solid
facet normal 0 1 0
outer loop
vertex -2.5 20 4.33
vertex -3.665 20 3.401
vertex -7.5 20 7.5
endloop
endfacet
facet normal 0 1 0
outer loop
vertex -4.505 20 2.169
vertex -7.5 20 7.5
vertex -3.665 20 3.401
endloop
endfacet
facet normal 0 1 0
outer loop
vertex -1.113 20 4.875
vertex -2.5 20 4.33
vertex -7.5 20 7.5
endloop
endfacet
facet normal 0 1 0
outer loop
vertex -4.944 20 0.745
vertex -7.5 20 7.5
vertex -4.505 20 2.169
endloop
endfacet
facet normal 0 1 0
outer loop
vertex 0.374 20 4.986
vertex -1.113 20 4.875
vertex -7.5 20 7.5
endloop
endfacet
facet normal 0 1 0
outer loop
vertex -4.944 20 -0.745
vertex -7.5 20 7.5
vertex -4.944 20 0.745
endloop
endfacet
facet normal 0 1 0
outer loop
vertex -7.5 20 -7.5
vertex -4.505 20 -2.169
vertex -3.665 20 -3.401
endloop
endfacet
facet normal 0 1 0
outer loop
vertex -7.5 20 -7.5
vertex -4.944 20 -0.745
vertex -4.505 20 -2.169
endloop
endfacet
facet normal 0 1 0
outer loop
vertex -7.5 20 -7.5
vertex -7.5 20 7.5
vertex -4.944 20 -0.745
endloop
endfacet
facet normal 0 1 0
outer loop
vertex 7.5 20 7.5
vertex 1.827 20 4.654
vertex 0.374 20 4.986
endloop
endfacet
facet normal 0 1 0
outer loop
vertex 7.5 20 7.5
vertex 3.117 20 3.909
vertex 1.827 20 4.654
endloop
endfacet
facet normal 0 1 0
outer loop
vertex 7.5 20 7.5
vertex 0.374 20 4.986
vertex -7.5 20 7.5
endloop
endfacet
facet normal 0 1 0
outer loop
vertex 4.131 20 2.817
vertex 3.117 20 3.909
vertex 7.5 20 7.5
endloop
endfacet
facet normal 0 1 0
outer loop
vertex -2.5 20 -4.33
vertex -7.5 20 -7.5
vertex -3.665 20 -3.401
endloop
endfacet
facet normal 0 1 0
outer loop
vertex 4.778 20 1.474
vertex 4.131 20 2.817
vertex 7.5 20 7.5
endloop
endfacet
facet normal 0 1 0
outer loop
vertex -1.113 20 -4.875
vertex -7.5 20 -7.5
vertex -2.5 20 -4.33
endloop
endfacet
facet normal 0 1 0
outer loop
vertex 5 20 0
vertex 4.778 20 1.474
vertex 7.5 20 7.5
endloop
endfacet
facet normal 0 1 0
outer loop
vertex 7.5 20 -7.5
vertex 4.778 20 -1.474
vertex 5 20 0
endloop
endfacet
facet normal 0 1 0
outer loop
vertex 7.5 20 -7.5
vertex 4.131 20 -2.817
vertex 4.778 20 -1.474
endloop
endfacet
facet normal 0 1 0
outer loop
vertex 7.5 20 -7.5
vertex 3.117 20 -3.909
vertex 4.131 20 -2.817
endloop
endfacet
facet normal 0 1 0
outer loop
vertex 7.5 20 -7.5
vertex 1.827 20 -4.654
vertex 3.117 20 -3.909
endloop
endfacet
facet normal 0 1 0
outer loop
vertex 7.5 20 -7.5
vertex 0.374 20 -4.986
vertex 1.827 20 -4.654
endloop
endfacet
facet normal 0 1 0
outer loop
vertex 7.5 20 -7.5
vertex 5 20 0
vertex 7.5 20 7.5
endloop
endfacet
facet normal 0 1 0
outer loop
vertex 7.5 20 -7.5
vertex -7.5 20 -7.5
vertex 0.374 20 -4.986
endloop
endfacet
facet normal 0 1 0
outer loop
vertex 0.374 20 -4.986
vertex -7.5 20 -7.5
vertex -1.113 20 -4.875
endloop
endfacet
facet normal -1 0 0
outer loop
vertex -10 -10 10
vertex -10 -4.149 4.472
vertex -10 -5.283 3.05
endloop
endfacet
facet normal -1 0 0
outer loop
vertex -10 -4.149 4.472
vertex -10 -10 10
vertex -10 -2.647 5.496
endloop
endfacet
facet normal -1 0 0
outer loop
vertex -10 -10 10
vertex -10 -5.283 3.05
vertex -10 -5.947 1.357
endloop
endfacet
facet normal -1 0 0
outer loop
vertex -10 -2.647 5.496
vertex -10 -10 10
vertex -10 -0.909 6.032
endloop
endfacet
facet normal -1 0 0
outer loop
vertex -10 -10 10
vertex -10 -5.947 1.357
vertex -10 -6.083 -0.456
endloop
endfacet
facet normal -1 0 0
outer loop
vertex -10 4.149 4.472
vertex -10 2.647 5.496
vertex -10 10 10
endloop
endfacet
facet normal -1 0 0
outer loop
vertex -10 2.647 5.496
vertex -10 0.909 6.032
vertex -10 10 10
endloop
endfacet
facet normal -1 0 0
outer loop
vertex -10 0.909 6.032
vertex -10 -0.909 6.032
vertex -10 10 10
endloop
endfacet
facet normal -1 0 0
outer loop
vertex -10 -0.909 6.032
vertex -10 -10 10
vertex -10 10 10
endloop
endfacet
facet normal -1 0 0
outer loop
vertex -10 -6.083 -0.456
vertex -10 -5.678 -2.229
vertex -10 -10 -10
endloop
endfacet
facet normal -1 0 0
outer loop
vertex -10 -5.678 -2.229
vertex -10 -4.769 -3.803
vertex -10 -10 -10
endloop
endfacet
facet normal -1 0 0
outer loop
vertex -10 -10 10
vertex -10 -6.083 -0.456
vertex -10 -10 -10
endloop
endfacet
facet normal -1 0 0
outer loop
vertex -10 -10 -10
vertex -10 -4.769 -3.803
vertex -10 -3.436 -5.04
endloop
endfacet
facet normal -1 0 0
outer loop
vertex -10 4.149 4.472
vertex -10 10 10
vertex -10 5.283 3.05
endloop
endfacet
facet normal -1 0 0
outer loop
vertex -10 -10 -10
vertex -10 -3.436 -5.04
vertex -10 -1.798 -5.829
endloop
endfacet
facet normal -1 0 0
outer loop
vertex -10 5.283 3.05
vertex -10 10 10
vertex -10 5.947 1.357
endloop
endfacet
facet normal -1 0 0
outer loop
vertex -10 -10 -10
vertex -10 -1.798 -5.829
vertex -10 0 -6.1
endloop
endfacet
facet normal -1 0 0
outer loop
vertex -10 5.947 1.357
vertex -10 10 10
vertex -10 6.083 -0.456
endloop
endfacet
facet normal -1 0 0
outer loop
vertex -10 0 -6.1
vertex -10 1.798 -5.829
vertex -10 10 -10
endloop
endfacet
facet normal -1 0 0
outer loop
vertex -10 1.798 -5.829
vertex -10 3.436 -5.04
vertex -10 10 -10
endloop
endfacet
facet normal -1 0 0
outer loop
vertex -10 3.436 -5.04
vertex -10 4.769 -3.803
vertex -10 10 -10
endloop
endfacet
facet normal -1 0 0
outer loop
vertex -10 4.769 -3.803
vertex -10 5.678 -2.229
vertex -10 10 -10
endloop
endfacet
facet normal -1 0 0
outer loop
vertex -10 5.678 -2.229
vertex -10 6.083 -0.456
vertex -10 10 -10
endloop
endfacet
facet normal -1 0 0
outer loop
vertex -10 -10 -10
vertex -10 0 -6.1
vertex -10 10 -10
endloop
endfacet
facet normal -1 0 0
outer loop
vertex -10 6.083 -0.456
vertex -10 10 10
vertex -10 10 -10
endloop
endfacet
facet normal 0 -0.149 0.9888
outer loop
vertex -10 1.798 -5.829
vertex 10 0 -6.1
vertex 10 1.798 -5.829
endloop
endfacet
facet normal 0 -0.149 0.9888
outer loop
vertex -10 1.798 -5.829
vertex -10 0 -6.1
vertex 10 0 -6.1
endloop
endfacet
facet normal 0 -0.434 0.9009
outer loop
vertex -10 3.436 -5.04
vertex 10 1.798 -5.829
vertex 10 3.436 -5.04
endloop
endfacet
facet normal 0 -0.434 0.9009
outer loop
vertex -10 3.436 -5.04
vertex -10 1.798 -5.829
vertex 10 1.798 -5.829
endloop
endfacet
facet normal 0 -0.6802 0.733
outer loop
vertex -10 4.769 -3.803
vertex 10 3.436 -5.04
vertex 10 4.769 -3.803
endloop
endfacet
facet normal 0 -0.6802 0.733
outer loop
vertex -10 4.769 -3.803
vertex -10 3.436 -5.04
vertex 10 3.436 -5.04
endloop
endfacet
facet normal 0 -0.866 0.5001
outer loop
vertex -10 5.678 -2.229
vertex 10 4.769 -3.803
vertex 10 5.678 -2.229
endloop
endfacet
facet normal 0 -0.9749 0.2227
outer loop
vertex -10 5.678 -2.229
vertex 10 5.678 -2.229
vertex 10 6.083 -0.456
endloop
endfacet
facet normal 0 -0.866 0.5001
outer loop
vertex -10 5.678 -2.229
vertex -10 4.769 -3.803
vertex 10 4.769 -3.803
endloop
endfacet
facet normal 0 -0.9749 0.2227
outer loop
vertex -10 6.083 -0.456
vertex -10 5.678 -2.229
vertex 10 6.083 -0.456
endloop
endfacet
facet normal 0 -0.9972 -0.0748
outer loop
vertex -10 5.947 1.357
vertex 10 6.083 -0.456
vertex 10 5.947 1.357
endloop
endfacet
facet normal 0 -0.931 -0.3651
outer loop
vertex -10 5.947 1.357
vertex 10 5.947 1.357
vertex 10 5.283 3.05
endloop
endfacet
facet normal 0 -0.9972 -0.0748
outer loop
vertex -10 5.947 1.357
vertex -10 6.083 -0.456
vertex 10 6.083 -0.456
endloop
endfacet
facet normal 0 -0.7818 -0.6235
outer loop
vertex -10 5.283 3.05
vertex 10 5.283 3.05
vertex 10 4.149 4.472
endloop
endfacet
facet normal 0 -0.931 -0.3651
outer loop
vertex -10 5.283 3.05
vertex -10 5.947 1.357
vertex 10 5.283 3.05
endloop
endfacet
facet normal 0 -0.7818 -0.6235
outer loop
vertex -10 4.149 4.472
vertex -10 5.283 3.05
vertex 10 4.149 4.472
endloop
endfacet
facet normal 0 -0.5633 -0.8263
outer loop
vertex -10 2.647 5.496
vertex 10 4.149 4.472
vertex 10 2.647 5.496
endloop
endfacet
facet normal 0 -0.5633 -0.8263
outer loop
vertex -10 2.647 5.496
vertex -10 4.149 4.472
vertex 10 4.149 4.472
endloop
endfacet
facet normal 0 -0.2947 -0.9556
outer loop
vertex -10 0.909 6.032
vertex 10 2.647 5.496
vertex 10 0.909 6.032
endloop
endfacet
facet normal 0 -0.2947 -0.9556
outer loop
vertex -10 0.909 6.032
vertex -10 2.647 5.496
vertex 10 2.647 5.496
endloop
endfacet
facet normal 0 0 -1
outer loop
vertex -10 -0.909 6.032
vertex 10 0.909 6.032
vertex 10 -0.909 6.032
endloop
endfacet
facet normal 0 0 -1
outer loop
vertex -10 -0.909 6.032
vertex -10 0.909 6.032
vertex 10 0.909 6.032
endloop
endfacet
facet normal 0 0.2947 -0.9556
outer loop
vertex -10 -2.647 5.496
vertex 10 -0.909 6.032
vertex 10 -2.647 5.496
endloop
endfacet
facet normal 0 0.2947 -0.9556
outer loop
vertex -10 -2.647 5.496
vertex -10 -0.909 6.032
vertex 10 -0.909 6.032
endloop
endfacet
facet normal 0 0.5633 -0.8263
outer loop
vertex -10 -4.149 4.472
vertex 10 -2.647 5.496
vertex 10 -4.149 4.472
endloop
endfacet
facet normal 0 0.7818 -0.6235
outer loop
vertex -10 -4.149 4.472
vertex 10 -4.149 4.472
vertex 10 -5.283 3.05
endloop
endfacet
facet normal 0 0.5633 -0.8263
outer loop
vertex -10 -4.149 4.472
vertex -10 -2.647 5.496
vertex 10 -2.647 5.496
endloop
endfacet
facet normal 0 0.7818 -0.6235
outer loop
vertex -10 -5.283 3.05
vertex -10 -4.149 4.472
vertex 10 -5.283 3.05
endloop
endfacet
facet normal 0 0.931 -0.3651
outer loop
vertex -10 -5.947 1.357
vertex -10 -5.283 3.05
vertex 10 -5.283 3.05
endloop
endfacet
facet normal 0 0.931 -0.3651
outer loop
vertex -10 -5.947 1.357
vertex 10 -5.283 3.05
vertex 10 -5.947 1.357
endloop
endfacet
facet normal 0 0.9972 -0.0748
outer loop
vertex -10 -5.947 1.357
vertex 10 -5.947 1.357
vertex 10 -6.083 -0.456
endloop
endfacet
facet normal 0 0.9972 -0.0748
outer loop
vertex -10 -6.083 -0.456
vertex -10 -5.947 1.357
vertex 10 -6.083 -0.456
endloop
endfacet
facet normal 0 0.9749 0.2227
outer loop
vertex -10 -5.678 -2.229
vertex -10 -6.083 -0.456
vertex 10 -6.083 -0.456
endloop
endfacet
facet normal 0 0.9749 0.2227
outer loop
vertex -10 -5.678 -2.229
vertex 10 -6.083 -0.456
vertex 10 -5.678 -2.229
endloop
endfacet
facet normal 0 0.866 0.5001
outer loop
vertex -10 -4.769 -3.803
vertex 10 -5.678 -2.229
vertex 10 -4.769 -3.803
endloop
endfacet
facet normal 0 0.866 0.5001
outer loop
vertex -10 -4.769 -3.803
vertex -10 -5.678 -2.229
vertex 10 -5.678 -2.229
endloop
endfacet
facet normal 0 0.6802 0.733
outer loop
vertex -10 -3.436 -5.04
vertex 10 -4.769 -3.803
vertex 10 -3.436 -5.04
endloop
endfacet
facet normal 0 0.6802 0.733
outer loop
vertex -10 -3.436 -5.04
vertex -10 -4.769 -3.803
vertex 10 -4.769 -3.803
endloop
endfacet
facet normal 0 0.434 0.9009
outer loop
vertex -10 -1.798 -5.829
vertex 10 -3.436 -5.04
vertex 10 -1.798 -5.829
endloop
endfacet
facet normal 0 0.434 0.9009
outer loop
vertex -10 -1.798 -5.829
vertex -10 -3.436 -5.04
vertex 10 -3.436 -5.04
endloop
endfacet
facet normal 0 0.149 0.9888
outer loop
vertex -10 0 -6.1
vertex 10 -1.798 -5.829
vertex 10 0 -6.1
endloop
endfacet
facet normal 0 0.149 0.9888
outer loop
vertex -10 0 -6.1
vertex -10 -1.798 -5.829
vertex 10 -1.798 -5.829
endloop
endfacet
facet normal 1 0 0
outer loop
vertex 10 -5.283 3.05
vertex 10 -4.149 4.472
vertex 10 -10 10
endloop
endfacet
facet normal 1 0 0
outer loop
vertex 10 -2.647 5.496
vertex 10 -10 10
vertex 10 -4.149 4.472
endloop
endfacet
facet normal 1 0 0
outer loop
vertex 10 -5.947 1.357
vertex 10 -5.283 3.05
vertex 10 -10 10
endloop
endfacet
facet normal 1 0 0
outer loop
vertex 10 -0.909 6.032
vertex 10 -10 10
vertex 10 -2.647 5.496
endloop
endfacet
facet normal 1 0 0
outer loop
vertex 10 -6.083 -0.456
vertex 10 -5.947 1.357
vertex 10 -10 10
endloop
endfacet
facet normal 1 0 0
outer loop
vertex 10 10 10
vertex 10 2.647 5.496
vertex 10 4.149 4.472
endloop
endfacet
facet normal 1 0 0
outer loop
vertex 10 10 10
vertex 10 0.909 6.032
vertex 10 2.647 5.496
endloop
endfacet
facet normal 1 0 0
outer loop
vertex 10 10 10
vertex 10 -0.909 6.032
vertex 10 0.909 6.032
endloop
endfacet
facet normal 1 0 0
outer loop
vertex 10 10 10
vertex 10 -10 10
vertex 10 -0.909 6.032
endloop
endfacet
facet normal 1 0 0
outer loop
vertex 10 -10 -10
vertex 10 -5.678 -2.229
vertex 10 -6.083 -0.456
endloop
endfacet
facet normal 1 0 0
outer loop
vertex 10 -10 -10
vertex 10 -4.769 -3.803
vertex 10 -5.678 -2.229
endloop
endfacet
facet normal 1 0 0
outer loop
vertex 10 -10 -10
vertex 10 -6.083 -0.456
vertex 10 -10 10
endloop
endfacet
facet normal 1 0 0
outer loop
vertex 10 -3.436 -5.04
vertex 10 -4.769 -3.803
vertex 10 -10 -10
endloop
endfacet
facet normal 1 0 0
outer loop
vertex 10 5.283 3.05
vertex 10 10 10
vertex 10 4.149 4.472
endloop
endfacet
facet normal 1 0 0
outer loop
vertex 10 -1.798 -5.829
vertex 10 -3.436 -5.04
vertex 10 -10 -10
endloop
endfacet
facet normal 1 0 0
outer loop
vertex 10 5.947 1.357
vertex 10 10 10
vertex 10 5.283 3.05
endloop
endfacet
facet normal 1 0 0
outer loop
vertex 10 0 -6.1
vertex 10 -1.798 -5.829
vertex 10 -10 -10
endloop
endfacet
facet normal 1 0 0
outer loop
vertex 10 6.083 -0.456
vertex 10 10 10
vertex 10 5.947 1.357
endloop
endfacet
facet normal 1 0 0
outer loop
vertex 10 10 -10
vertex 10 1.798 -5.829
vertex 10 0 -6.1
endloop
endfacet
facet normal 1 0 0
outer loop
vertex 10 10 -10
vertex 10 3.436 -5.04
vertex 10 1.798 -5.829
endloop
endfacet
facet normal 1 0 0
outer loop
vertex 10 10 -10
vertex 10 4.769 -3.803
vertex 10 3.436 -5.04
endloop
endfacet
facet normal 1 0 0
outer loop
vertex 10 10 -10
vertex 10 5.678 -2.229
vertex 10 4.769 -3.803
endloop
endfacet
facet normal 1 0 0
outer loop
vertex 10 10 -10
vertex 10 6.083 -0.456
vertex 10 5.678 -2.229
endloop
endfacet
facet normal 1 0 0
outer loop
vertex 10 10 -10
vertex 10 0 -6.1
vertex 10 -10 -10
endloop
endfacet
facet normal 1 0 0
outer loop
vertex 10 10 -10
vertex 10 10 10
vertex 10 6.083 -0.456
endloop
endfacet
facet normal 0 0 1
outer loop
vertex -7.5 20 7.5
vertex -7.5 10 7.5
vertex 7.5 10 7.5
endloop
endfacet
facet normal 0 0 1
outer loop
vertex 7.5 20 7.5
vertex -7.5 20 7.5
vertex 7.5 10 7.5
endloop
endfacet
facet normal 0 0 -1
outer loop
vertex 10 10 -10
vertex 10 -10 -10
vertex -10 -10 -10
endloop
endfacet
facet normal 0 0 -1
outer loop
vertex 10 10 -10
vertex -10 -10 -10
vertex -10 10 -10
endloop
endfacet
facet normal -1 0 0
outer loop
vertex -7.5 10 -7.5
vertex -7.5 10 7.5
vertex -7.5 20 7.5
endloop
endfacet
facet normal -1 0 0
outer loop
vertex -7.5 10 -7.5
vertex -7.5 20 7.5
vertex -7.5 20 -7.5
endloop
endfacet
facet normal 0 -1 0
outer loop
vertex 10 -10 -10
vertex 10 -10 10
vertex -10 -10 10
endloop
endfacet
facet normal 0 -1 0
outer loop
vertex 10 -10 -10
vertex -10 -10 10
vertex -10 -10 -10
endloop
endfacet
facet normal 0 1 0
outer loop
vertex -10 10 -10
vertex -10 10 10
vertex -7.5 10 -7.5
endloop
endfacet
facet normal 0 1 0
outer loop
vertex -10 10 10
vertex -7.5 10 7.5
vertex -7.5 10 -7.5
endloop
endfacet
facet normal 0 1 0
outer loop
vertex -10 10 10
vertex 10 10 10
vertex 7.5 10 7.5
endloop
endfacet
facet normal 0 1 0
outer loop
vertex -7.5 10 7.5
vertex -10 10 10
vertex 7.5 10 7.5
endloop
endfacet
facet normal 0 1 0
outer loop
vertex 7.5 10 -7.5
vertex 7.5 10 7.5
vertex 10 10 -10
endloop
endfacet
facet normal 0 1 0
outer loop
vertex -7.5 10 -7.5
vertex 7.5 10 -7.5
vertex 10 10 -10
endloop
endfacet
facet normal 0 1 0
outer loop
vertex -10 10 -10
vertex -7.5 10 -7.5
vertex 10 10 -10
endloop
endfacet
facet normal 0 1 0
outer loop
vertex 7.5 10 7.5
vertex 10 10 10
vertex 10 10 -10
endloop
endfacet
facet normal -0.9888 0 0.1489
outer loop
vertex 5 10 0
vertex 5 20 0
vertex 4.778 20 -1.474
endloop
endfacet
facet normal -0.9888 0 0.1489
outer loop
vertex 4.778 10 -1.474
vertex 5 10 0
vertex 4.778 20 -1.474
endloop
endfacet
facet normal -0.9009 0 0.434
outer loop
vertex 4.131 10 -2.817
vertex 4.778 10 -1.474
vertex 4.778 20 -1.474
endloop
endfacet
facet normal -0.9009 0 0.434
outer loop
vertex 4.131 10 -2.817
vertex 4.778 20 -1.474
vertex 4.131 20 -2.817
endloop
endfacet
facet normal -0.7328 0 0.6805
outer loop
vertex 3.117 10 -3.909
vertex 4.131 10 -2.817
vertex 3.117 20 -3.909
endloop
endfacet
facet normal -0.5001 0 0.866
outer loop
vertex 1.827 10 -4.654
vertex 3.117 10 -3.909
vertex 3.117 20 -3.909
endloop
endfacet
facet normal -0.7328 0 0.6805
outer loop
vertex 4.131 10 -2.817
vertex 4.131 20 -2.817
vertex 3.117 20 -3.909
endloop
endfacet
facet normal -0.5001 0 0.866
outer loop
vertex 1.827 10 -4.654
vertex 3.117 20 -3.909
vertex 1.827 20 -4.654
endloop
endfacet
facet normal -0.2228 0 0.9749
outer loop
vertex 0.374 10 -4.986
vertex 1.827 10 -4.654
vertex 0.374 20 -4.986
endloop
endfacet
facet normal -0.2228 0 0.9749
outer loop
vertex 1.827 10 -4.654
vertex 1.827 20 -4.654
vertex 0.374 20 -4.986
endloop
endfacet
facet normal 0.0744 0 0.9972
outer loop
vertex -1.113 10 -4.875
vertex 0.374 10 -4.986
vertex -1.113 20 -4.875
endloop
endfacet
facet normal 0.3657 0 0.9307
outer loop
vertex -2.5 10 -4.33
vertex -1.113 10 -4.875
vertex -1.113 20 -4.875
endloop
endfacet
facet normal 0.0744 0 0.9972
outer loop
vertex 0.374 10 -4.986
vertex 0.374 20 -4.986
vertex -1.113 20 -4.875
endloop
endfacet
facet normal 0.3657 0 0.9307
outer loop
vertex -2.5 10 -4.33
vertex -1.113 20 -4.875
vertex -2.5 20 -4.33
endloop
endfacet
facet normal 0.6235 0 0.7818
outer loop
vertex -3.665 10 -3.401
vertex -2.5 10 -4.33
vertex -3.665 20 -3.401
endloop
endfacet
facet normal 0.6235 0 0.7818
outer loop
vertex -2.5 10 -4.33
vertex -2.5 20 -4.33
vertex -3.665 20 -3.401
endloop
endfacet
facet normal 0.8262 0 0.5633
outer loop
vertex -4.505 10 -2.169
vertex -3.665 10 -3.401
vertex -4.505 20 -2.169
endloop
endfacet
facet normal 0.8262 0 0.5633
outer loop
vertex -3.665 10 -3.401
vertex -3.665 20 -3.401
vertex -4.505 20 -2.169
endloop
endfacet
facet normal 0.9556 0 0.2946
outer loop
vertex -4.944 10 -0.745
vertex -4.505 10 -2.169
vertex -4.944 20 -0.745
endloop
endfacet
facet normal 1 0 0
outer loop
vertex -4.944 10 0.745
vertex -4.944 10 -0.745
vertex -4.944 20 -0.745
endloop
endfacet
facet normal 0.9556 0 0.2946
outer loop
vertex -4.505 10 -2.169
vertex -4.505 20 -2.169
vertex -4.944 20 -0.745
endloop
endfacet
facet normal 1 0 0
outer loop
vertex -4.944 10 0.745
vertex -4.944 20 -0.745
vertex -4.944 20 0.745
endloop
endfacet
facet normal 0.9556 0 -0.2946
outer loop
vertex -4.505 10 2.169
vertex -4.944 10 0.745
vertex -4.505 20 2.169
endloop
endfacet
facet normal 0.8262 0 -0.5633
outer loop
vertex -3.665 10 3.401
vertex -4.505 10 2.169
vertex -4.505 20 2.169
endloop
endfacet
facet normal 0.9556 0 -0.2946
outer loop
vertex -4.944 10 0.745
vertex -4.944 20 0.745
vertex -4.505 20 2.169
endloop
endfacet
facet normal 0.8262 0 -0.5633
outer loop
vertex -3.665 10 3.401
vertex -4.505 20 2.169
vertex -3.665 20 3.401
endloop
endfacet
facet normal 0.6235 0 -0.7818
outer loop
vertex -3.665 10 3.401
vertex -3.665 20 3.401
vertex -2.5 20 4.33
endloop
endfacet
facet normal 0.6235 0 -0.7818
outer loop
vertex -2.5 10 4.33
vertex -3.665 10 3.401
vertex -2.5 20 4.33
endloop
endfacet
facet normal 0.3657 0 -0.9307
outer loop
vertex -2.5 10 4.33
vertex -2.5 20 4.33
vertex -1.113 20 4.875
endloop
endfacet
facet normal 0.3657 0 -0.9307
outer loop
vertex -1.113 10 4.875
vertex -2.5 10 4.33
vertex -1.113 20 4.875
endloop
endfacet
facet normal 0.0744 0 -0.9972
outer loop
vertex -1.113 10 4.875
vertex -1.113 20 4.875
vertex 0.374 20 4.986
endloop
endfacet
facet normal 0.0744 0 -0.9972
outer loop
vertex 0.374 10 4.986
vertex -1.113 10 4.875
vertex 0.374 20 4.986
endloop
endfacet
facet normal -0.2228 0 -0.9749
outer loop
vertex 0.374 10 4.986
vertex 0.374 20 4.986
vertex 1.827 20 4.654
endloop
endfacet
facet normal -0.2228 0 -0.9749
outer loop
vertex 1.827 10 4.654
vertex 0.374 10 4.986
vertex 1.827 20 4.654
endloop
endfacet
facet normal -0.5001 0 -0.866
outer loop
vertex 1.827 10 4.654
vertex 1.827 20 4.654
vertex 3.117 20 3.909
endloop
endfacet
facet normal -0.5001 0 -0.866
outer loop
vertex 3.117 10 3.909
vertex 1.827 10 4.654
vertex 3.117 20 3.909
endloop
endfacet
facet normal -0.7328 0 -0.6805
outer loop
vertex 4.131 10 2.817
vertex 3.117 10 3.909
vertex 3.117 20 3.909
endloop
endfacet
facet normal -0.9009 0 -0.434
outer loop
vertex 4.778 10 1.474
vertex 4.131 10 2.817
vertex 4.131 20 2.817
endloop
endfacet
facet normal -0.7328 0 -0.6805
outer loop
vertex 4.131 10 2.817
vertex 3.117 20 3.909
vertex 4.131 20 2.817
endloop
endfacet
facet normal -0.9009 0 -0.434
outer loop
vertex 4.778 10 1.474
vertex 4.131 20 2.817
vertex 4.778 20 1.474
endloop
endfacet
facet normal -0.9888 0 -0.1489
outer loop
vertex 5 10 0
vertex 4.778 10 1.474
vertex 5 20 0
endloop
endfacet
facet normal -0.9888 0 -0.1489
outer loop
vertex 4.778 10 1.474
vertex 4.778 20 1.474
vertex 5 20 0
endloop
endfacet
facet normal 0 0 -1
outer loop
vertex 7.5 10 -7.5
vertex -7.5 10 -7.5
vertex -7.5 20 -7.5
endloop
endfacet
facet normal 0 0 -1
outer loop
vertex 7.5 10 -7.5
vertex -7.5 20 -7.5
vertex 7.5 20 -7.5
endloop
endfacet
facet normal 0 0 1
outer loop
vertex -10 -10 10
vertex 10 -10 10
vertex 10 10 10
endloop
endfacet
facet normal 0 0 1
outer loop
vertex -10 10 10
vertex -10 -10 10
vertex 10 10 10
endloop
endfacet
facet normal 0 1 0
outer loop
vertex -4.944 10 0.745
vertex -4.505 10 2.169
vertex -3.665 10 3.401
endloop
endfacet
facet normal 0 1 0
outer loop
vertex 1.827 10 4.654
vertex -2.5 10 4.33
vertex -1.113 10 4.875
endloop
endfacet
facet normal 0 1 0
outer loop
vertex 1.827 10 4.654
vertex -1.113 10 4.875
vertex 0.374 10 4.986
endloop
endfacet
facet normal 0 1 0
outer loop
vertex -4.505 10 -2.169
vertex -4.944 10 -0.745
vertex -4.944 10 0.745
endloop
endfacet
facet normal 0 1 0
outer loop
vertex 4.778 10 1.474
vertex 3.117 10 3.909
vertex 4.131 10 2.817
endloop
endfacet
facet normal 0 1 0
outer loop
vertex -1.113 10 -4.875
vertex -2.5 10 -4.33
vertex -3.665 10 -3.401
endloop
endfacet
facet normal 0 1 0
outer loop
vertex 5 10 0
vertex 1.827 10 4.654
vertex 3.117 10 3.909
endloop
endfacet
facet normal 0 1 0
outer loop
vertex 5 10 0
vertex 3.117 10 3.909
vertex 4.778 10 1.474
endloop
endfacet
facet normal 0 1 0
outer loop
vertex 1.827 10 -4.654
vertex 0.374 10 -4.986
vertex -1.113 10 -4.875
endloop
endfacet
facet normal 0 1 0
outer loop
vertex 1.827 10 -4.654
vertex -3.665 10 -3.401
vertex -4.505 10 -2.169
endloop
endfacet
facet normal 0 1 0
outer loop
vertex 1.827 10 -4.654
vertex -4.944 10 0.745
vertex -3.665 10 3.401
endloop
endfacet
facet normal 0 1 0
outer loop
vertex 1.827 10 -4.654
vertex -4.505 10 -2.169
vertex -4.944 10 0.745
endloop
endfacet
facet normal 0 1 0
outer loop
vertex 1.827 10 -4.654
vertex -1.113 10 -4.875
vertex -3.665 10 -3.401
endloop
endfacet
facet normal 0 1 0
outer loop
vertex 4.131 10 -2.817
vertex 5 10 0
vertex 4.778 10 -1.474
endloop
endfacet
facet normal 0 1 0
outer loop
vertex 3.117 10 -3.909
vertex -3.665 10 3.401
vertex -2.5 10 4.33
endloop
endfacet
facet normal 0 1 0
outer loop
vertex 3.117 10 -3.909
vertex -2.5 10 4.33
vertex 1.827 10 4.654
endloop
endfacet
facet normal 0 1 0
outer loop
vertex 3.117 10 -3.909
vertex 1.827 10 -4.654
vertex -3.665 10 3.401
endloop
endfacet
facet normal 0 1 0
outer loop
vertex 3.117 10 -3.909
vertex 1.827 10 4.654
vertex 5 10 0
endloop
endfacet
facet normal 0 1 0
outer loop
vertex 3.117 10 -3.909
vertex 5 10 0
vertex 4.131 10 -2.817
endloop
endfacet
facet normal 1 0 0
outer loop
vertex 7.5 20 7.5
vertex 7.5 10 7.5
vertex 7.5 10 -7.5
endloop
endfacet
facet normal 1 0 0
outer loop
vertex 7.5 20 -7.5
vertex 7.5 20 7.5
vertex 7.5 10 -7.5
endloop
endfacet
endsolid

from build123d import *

# Parameters (mm, degrees)
SKETCH1_W           = 20
SKETCH1_H           = 20
SKETCH1_R           = 6.1
BOSS_EXTRUDE1_DEPTH = 10
SKETCH2_W           = 15
SKETCH2_H           = 15
BOSS_EXTRUDE2_DEPTH = 10
SKETCH3_R           = 5
CUT_EXTRUDE1_DEPTH  = 10


with BuildPart() as part:
    # Sketch1 → Boss-Extrude1 (new body, symmetric)
    with BuildSketch(Plane(origin=(0, 0, 0), x_dir=(0, 0, -1), z_dir=(1, 0, 0))):
        Rectangle(SKETCH1_W, SKETCH1_H)
        Circle(SKETCH1_R, mode=Mode.SUBTRACT)
    extrude(amount=BOSS_EXTRUDE1_DEPTH, both=True)

    # Sketch2 → Boss-Extrude2 (add)
    with BuildSketch(Plane(origin=(0, 10, 0), x_dir=(1, 0, 0), z_dir=(0, 1, 0))):
        Rectangle(SKETCH2_W, SKETCH2_H)
    extrude(amount=BOSS_EXTRUDE2_DEPTH)

    # Sketch3 → Cut-Extrude1 (cut)
    with BuildSketch(Plane(origin=(0, 20, 0), x_dir=(1, 0, 0), z_dir=(0, 1, 0))):
        Circle(SKETCH3_R)
    extrude(amount=-CUT_EXTRUDE1_DEPTH, mode=Mode.SUBTRACT)


solid = part.part
